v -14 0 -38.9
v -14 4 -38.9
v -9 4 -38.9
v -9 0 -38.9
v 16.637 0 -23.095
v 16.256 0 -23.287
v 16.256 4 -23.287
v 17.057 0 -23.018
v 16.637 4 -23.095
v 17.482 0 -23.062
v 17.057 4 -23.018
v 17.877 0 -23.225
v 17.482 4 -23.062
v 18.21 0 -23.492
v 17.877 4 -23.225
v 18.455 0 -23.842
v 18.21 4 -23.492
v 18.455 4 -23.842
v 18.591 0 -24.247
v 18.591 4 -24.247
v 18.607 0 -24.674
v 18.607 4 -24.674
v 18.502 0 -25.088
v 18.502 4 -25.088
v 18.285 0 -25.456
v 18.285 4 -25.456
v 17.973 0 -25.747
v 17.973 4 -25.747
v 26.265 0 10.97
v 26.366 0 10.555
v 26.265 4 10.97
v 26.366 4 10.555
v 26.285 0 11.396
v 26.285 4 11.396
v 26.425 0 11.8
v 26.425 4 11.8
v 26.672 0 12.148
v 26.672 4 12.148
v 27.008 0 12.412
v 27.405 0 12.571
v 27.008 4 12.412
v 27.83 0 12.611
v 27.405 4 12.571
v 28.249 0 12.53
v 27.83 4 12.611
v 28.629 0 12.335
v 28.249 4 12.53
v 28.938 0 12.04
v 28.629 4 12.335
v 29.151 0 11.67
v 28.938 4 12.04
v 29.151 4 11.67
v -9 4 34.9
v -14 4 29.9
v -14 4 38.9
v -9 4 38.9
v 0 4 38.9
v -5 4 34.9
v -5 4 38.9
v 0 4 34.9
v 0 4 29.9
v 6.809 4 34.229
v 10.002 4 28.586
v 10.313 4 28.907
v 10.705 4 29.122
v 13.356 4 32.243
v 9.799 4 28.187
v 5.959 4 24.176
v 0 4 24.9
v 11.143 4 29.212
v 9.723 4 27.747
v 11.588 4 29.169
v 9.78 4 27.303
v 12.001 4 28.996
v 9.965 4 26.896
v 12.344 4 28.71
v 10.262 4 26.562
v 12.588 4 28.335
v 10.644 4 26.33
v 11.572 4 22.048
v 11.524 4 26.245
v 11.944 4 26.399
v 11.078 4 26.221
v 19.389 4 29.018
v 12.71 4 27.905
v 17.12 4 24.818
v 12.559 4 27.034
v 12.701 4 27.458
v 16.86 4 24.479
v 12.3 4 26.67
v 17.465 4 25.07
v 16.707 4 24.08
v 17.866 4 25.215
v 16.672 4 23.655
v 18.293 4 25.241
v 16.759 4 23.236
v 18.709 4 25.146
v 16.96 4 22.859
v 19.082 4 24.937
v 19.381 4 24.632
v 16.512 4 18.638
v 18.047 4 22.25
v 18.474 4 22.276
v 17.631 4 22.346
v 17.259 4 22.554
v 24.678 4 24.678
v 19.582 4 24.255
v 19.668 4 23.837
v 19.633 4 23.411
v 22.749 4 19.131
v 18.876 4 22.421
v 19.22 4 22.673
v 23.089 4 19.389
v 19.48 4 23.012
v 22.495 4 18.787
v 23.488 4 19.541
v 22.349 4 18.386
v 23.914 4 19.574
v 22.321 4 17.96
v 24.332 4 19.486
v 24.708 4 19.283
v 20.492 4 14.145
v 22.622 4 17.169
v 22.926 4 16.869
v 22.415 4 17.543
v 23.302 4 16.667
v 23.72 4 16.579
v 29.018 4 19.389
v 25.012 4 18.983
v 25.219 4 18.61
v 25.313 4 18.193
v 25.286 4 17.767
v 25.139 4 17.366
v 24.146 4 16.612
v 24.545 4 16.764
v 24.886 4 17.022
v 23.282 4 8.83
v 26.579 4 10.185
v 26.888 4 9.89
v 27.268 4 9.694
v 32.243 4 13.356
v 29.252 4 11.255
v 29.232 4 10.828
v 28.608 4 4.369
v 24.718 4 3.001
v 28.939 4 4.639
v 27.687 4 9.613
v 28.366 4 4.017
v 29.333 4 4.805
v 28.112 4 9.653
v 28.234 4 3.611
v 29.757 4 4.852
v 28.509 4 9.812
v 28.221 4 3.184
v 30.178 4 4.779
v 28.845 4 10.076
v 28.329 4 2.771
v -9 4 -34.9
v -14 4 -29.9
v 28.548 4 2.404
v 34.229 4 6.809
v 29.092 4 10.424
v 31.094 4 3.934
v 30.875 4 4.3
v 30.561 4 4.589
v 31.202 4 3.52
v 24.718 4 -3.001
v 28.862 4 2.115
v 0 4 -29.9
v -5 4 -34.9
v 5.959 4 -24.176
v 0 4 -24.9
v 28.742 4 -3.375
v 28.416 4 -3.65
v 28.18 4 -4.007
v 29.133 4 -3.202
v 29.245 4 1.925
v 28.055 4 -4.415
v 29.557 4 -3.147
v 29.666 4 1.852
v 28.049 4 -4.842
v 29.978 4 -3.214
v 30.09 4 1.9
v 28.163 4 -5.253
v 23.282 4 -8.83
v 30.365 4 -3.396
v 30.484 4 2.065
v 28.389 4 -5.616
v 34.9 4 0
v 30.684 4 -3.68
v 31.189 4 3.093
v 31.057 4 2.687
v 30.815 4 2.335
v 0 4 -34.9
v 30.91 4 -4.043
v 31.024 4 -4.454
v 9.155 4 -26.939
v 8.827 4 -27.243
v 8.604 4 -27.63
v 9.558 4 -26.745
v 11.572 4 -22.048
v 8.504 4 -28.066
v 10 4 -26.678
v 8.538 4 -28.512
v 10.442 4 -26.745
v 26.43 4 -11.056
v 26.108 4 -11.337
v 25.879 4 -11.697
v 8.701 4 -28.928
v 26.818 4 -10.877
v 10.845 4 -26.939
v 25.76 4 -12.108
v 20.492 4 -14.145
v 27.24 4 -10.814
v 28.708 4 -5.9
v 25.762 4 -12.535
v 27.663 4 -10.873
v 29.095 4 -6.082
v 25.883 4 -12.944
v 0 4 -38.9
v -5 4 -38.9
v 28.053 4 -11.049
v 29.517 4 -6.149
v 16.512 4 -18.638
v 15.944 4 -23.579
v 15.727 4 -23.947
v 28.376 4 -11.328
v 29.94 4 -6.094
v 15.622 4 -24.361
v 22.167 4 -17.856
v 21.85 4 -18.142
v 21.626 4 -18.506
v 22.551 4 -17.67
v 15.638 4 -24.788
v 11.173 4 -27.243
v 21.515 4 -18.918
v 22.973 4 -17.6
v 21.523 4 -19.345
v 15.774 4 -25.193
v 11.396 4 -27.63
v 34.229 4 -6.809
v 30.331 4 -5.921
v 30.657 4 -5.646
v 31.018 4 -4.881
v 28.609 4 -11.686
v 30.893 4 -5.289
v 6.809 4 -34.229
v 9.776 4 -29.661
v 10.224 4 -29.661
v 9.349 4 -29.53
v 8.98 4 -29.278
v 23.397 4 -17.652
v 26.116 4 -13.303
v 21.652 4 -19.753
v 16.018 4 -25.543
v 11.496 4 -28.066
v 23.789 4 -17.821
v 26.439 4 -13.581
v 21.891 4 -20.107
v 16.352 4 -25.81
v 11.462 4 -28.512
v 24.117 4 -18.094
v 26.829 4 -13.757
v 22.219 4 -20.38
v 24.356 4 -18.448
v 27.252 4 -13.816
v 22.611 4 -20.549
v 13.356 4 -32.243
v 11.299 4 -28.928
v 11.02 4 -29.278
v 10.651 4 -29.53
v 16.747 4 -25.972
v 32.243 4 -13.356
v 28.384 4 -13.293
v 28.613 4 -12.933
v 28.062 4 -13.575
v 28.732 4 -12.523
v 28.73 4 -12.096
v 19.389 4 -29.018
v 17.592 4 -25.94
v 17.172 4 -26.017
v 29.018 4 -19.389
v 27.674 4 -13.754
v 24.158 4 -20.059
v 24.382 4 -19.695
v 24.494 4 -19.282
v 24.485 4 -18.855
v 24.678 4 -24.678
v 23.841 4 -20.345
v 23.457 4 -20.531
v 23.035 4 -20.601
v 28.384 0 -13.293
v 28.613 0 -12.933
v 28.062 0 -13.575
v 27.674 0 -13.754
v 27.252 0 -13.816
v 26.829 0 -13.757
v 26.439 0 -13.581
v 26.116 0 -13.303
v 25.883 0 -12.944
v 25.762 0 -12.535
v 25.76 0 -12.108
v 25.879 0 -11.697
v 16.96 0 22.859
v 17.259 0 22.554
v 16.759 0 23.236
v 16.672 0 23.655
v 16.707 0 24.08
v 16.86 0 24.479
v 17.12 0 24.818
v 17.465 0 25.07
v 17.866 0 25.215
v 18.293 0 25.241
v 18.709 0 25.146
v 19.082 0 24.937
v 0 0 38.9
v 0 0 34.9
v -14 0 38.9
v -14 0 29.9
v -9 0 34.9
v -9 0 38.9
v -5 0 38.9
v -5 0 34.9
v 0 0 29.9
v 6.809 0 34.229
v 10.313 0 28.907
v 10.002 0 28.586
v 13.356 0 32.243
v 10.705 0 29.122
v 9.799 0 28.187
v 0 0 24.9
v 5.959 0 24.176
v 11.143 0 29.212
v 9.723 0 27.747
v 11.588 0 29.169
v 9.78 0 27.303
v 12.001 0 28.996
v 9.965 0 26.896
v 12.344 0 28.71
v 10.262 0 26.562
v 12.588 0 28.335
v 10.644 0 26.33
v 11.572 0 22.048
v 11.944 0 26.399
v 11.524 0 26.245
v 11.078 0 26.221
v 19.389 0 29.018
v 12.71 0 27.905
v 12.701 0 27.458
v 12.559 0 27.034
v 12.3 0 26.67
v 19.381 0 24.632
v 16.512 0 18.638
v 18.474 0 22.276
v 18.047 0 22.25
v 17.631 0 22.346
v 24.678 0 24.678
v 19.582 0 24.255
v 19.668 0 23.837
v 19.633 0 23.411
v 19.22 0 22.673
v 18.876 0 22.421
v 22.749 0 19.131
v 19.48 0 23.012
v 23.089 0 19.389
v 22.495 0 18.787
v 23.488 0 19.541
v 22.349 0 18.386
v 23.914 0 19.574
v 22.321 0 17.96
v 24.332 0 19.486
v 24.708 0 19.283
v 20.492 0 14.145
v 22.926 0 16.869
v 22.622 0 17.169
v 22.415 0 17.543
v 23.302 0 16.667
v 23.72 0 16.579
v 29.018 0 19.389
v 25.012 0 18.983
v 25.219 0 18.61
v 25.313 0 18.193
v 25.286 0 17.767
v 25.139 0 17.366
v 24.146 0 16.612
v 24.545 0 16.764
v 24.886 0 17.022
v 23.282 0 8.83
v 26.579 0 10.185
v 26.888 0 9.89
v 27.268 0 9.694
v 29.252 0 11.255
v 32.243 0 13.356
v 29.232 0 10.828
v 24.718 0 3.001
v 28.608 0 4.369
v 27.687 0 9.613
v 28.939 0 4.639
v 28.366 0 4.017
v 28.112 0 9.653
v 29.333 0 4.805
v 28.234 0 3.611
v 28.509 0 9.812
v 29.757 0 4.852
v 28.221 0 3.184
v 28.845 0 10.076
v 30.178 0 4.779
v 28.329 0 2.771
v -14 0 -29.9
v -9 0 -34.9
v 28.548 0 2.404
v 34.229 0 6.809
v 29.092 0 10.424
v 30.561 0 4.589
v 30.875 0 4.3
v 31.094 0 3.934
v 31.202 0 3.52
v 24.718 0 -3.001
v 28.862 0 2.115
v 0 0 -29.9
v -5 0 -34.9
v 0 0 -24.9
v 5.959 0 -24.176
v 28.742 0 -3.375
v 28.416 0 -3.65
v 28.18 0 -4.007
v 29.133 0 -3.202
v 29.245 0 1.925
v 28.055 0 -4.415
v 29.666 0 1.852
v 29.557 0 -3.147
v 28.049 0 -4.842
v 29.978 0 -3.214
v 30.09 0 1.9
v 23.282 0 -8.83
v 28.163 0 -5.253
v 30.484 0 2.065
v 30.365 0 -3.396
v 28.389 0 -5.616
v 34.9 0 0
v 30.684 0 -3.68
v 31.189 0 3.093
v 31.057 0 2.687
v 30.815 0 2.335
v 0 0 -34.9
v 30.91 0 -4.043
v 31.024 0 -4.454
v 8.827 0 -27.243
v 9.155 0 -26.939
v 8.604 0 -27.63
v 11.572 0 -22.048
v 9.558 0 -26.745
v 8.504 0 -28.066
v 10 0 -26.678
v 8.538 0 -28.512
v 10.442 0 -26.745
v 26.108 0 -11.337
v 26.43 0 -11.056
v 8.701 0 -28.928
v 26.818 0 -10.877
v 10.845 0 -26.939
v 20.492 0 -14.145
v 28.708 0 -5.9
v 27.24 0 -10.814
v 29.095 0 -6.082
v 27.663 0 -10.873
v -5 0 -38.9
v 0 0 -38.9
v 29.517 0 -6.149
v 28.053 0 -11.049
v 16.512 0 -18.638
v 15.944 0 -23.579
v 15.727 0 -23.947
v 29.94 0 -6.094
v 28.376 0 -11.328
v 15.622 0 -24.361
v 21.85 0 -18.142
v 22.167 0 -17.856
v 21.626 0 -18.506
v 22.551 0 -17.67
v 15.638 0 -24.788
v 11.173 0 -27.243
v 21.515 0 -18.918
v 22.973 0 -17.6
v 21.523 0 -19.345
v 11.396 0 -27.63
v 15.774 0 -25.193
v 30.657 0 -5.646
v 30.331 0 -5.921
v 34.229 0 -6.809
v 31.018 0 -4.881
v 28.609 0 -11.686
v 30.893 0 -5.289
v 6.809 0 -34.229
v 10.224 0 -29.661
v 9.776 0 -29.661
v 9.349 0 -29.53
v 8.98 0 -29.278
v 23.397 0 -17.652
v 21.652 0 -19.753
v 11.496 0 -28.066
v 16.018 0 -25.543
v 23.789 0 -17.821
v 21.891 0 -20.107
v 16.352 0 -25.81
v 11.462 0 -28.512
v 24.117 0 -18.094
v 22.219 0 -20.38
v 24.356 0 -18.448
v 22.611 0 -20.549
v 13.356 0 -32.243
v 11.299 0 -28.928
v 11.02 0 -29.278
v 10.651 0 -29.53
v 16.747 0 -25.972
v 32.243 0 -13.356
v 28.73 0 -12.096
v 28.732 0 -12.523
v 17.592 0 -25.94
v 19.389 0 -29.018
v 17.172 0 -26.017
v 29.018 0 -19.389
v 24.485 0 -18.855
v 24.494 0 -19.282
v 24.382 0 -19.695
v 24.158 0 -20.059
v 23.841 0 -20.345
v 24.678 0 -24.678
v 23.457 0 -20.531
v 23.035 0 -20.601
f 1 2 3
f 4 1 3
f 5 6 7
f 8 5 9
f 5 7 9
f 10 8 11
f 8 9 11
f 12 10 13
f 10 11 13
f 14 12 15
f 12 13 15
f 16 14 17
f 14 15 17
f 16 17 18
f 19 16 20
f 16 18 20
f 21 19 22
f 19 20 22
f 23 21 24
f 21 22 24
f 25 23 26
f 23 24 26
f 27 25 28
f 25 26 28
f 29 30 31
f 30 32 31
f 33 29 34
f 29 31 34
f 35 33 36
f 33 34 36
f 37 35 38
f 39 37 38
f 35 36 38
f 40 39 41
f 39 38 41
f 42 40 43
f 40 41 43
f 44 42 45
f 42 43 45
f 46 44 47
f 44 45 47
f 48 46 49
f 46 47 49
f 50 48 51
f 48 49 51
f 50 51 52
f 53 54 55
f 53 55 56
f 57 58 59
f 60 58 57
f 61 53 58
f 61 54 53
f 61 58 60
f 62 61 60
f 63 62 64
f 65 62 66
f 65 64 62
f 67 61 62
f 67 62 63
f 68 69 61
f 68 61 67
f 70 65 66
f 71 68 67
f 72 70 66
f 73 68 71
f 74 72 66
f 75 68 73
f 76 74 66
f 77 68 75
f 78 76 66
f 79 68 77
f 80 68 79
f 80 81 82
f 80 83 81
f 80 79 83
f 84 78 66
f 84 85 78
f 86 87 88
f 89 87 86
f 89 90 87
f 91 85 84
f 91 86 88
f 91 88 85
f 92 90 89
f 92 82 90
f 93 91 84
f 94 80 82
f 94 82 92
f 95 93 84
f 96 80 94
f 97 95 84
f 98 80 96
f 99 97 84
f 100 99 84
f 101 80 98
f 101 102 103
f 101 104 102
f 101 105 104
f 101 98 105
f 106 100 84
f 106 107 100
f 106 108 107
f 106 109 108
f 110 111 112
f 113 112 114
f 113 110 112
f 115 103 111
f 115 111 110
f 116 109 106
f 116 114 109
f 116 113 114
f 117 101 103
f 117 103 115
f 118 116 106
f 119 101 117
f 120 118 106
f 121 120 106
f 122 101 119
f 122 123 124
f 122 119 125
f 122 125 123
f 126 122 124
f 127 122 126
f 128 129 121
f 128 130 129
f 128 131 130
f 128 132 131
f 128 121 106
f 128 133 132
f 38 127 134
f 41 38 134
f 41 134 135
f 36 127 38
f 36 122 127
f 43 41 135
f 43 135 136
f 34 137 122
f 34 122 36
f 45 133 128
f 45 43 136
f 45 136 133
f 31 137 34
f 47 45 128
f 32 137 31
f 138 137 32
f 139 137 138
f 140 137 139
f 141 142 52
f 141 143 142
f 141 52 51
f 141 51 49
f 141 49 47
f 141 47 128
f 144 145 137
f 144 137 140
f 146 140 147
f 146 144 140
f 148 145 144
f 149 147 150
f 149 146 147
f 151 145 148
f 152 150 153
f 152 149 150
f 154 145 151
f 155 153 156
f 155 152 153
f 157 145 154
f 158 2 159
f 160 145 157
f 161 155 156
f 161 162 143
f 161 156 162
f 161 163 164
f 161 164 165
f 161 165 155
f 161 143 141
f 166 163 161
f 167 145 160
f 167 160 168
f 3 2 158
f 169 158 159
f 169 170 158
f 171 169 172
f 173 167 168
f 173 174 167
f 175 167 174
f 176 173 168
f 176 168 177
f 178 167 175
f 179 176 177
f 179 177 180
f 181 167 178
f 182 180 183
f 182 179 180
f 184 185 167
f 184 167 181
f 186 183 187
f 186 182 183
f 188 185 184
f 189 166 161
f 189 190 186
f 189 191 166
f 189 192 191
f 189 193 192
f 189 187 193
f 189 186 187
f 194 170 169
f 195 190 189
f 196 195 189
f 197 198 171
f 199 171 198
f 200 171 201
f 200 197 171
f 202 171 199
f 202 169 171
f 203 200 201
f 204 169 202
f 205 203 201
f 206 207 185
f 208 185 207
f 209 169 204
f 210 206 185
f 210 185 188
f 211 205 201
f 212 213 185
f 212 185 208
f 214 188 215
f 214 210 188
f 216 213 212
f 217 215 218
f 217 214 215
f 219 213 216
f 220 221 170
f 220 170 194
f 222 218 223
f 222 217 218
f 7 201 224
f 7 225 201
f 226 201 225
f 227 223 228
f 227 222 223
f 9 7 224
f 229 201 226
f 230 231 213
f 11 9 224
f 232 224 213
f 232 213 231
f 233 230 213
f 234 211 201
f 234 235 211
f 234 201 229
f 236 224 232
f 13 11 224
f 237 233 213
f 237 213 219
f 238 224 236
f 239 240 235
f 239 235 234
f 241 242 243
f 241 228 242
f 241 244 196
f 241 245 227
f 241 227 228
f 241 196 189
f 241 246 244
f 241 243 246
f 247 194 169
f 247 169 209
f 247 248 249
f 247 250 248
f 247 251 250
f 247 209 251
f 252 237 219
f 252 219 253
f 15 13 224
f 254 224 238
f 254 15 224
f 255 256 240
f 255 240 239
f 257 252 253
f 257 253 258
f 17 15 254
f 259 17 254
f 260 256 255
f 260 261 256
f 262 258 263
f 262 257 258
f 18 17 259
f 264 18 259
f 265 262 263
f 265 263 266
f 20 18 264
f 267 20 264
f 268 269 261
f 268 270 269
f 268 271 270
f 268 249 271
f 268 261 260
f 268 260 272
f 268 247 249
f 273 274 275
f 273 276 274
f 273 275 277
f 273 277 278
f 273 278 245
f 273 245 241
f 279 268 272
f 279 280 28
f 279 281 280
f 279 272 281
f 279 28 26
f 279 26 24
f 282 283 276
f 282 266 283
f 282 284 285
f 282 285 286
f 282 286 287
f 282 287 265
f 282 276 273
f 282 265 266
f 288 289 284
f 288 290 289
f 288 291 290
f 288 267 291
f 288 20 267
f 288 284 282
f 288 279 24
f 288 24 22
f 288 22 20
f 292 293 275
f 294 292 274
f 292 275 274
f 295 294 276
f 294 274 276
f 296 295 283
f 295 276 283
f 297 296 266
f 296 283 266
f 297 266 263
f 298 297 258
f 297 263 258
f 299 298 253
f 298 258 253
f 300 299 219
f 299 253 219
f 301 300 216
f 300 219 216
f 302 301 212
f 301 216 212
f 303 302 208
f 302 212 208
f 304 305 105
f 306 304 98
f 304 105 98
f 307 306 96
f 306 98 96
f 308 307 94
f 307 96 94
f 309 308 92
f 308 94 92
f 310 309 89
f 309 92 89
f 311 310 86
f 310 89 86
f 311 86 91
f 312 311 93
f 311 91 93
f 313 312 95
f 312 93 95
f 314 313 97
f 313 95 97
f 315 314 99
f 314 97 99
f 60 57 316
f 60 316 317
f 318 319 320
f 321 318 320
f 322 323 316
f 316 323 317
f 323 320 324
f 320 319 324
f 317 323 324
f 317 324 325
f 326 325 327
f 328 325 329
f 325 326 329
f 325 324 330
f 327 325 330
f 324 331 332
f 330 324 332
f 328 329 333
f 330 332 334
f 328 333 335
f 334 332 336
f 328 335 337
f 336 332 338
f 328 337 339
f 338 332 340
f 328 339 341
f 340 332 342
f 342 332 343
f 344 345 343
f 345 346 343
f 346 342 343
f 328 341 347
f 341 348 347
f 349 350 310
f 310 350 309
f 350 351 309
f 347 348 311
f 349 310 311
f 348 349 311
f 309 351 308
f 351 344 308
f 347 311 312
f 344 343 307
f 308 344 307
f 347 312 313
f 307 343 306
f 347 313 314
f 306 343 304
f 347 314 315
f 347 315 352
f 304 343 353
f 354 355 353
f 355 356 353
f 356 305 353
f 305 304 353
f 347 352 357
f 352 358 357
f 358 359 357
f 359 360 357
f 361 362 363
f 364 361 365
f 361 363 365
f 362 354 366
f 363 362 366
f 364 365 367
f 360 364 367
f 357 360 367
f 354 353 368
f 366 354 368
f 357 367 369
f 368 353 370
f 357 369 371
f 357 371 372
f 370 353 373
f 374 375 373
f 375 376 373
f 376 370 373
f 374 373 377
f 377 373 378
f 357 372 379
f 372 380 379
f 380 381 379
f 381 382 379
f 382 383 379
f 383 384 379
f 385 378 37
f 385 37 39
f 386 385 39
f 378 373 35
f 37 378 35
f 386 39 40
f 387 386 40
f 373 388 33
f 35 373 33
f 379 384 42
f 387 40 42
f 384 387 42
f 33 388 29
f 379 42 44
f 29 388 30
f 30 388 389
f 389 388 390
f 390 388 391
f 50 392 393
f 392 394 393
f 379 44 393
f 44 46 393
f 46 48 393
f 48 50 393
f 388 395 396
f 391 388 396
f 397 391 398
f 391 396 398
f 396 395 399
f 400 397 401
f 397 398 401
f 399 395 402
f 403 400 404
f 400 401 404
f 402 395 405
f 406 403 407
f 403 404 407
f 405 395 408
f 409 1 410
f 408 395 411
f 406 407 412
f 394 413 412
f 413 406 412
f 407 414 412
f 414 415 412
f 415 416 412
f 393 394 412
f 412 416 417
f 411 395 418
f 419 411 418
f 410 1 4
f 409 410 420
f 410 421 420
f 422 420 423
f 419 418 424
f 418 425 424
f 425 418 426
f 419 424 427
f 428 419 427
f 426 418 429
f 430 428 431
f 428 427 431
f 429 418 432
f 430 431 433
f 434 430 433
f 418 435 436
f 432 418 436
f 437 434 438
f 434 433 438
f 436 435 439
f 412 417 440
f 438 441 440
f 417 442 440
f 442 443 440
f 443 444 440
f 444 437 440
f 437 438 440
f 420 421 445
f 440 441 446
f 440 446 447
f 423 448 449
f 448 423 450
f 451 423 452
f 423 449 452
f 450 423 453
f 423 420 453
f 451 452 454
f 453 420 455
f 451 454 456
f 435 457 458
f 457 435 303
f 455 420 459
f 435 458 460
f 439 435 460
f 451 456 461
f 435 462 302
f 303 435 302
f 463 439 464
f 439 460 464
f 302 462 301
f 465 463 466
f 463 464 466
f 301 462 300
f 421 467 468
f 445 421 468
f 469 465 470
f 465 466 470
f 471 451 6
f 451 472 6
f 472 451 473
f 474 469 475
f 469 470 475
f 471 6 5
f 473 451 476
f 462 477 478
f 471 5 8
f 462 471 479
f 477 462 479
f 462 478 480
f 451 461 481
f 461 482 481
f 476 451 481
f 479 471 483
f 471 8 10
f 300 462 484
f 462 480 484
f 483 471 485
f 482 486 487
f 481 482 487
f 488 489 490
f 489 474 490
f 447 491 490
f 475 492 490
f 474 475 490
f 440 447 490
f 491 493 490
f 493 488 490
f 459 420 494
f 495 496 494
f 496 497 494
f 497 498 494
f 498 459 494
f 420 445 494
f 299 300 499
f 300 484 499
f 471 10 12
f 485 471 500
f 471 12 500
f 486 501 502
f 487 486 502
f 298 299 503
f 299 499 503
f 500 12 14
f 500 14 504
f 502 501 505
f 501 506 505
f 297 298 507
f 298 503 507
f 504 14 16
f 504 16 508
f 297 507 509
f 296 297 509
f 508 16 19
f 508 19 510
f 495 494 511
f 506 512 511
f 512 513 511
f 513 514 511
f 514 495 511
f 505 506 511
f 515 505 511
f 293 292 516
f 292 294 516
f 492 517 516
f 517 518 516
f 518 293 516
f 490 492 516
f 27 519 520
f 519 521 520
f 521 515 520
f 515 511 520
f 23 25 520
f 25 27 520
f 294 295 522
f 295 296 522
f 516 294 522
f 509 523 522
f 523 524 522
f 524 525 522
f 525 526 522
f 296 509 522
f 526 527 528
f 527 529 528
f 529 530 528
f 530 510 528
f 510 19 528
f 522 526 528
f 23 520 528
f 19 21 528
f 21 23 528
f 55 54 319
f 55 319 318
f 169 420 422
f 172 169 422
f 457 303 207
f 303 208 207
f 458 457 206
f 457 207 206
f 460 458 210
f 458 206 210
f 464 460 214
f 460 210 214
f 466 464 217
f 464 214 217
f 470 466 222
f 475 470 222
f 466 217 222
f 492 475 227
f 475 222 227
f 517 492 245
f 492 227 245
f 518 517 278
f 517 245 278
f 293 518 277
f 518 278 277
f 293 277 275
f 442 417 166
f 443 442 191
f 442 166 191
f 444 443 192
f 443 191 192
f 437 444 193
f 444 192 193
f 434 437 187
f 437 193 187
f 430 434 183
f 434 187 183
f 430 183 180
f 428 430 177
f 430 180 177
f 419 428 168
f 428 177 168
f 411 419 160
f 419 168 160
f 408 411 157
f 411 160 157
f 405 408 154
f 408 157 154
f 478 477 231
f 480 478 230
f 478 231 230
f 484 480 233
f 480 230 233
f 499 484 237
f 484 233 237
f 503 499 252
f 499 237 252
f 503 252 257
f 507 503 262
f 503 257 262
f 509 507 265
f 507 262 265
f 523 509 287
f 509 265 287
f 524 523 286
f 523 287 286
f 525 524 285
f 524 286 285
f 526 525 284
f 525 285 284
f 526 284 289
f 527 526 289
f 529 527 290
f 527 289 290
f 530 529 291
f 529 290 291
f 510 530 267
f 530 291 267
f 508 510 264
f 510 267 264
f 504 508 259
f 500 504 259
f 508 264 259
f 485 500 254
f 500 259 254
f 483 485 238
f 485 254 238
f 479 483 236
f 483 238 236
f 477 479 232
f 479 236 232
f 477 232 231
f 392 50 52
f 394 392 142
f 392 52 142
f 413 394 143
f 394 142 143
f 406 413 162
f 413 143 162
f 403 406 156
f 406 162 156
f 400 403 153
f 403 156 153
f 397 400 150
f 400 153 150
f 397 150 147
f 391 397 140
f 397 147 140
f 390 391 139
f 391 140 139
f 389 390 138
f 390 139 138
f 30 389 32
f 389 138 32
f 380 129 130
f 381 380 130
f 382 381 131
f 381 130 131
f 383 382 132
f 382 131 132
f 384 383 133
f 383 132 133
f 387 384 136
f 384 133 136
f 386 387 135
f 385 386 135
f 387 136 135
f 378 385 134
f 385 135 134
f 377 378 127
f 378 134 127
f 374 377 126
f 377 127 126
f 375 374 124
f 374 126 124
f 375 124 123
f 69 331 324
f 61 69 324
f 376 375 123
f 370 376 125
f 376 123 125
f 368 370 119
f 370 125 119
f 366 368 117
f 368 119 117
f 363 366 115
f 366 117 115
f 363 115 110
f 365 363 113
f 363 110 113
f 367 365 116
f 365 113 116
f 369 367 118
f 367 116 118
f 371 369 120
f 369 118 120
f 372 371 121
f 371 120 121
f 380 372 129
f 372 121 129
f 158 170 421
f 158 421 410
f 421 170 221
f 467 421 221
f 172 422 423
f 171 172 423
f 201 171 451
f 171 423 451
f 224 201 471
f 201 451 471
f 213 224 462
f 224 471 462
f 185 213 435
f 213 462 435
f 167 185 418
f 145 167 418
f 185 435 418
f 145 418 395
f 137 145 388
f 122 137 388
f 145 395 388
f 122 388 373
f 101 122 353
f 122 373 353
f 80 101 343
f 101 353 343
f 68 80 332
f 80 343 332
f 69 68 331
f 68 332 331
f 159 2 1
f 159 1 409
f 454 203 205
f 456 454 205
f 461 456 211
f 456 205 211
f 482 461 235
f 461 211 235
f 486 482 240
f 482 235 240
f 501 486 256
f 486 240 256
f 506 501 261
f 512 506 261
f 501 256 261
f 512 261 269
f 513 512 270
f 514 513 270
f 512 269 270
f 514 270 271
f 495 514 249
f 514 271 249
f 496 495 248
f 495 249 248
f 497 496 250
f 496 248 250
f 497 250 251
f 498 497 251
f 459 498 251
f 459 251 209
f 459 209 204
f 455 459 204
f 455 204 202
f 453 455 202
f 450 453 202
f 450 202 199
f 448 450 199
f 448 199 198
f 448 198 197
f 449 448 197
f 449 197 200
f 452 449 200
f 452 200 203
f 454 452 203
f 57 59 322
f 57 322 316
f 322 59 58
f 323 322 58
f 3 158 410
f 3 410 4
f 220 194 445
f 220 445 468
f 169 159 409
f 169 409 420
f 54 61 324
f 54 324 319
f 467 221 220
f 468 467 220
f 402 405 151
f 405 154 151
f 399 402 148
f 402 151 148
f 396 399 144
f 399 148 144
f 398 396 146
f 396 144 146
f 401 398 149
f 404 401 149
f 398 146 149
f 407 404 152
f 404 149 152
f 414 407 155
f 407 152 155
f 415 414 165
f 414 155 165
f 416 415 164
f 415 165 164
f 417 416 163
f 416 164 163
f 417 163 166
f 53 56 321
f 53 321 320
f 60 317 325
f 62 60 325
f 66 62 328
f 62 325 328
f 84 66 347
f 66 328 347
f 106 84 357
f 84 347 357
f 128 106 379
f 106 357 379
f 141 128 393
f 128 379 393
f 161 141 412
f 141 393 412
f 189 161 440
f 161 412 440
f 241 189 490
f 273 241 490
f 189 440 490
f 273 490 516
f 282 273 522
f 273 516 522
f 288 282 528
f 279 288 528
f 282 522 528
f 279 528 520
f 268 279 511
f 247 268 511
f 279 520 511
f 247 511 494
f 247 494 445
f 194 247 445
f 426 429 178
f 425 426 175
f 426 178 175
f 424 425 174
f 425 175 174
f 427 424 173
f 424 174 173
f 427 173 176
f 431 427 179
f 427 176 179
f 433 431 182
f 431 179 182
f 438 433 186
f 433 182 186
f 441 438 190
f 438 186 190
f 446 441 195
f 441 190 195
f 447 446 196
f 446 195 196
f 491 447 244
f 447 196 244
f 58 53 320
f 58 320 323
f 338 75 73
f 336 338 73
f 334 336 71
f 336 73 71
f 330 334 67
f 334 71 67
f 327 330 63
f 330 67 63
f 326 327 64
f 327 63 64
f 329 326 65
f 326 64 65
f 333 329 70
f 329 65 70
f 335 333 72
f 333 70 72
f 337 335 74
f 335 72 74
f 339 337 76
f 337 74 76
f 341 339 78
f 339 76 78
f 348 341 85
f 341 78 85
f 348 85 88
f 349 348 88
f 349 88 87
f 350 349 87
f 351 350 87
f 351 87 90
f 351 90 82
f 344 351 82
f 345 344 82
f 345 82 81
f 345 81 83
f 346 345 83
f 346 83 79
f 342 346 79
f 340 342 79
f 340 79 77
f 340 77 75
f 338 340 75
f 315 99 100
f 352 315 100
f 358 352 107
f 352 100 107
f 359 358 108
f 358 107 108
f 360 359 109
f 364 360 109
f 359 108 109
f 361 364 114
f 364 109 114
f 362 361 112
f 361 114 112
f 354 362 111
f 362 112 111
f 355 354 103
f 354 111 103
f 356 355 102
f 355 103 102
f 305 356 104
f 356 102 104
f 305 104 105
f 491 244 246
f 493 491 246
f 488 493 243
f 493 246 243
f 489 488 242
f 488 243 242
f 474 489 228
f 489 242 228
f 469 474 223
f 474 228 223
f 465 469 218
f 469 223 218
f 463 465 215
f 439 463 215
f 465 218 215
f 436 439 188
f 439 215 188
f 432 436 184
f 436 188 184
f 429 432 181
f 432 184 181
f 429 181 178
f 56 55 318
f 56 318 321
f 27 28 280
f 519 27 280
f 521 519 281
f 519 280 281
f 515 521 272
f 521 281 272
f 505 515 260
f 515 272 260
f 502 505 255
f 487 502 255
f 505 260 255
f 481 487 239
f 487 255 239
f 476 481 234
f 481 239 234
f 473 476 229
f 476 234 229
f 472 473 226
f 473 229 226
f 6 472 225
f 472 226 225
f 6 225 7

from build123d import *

# Parameters (mm, degrees)
BOSS_EXTRUDE1_DEPTH = 4
SKETCH2_W           = 5
SKETCH2_H           = 4
BOSS_EXTRUDE2_DEPTH = 4
SKETCH3_R           = 1.5
CUT_EXTRUDE1_DEPTH  = 53.413929446
CIRPATTERN2_COUNT   = 9
CIRPATTERN2_ANGLE   = 123.04


with BuildPart() as part:
    # Sketch1 → Boss-Extrude1 (new body)
    with BuildSketch(Plane(origin=(0, 0, 0), x_dir=(1, 0, 0), z_dir=(0, 1, 0))):
        with BuildLine():
            ThreePointArc((0, -34.9), (34.9, 0), (0, 34.9))
            Line((0, 34.9), (0, 24.9))
            ThreePointArc((0, 24.9), (24.9, 0), (0, -24.9))
            Line((0, -24.9), (0, -34.9))
        make_face()
    extrude(amount=BOSS_EXTRUDE1_DEPTH)

    # Sketch2 → Boss-Extrude2 (add, through all)
    with BuildSketch(Plane(origin=(0, 4, 0), x_dir=(1, 0, 0), z_dir=(0, 1, 0))):
        with Locations((-11.5, 36.9)):
            Rectangle(SKETCH2_W, SKETCH2_H)
        Polygon((-14, 29.9), (0, 29.9), (0, 34.9), (-5, 34.9), (-9, 34.9), (-14, 34.9), align=None)
        with Locations((-2.5, 36.9)):
            Rectangle(SKETCH2_W, SKETCH2_H)
        Polygon((-9, -34.9), (-5, -34.9), (0, -34.9), (0, -29.9), (-14, -29.9), (-14, -34.9), align=None)
        with Locations((-11.5, -36.9)):
            Rectangle(SKETCH2_W, SKETCH2_H)
        with Locations((-2.5, -36.9)):
            Rectangle(SKETCH2_W, SKETCH2_H)
    extrude(amount=-BOSS_EXTRUDE2_DEPTH)

    # Sketch3 → Cut-Extrude1 (cut, through all)
    with BuildSketch(Plane(origin=(0, 4, 0), x_dir=(1, 0, 0), z_dir=(0, 1, 0))):
        with Locations(Location((10, 28.17818305, 0), (0, 0, 270))):
            Circle(SKETCH3_R)
        with Locations(Location((17.113605639, 24.518044417, 0), (0, 0, 270))):
            Circle(SKETCH3_R)
    cut_extrude1 = extrude(amount=-CUT_EXTRUDE1_DEPTH, mode=Mode.SUBTRACT)

    # CirPattern2: Cut-Extrude1 ×9 about axis
    cirpattern2_axis = Axis((0, 0, 0), (0, -1, 0))
    for i in range(1, CIRPATTERN2_COUNT):
        add(cut_extrude1.rotate(cirpattern2_axis, i * CIRPATTERN2_ANGLE / (CIRPATTERN2_COUNT - 1)), mode=Mode.SUBTRACT)


solid = part.part
